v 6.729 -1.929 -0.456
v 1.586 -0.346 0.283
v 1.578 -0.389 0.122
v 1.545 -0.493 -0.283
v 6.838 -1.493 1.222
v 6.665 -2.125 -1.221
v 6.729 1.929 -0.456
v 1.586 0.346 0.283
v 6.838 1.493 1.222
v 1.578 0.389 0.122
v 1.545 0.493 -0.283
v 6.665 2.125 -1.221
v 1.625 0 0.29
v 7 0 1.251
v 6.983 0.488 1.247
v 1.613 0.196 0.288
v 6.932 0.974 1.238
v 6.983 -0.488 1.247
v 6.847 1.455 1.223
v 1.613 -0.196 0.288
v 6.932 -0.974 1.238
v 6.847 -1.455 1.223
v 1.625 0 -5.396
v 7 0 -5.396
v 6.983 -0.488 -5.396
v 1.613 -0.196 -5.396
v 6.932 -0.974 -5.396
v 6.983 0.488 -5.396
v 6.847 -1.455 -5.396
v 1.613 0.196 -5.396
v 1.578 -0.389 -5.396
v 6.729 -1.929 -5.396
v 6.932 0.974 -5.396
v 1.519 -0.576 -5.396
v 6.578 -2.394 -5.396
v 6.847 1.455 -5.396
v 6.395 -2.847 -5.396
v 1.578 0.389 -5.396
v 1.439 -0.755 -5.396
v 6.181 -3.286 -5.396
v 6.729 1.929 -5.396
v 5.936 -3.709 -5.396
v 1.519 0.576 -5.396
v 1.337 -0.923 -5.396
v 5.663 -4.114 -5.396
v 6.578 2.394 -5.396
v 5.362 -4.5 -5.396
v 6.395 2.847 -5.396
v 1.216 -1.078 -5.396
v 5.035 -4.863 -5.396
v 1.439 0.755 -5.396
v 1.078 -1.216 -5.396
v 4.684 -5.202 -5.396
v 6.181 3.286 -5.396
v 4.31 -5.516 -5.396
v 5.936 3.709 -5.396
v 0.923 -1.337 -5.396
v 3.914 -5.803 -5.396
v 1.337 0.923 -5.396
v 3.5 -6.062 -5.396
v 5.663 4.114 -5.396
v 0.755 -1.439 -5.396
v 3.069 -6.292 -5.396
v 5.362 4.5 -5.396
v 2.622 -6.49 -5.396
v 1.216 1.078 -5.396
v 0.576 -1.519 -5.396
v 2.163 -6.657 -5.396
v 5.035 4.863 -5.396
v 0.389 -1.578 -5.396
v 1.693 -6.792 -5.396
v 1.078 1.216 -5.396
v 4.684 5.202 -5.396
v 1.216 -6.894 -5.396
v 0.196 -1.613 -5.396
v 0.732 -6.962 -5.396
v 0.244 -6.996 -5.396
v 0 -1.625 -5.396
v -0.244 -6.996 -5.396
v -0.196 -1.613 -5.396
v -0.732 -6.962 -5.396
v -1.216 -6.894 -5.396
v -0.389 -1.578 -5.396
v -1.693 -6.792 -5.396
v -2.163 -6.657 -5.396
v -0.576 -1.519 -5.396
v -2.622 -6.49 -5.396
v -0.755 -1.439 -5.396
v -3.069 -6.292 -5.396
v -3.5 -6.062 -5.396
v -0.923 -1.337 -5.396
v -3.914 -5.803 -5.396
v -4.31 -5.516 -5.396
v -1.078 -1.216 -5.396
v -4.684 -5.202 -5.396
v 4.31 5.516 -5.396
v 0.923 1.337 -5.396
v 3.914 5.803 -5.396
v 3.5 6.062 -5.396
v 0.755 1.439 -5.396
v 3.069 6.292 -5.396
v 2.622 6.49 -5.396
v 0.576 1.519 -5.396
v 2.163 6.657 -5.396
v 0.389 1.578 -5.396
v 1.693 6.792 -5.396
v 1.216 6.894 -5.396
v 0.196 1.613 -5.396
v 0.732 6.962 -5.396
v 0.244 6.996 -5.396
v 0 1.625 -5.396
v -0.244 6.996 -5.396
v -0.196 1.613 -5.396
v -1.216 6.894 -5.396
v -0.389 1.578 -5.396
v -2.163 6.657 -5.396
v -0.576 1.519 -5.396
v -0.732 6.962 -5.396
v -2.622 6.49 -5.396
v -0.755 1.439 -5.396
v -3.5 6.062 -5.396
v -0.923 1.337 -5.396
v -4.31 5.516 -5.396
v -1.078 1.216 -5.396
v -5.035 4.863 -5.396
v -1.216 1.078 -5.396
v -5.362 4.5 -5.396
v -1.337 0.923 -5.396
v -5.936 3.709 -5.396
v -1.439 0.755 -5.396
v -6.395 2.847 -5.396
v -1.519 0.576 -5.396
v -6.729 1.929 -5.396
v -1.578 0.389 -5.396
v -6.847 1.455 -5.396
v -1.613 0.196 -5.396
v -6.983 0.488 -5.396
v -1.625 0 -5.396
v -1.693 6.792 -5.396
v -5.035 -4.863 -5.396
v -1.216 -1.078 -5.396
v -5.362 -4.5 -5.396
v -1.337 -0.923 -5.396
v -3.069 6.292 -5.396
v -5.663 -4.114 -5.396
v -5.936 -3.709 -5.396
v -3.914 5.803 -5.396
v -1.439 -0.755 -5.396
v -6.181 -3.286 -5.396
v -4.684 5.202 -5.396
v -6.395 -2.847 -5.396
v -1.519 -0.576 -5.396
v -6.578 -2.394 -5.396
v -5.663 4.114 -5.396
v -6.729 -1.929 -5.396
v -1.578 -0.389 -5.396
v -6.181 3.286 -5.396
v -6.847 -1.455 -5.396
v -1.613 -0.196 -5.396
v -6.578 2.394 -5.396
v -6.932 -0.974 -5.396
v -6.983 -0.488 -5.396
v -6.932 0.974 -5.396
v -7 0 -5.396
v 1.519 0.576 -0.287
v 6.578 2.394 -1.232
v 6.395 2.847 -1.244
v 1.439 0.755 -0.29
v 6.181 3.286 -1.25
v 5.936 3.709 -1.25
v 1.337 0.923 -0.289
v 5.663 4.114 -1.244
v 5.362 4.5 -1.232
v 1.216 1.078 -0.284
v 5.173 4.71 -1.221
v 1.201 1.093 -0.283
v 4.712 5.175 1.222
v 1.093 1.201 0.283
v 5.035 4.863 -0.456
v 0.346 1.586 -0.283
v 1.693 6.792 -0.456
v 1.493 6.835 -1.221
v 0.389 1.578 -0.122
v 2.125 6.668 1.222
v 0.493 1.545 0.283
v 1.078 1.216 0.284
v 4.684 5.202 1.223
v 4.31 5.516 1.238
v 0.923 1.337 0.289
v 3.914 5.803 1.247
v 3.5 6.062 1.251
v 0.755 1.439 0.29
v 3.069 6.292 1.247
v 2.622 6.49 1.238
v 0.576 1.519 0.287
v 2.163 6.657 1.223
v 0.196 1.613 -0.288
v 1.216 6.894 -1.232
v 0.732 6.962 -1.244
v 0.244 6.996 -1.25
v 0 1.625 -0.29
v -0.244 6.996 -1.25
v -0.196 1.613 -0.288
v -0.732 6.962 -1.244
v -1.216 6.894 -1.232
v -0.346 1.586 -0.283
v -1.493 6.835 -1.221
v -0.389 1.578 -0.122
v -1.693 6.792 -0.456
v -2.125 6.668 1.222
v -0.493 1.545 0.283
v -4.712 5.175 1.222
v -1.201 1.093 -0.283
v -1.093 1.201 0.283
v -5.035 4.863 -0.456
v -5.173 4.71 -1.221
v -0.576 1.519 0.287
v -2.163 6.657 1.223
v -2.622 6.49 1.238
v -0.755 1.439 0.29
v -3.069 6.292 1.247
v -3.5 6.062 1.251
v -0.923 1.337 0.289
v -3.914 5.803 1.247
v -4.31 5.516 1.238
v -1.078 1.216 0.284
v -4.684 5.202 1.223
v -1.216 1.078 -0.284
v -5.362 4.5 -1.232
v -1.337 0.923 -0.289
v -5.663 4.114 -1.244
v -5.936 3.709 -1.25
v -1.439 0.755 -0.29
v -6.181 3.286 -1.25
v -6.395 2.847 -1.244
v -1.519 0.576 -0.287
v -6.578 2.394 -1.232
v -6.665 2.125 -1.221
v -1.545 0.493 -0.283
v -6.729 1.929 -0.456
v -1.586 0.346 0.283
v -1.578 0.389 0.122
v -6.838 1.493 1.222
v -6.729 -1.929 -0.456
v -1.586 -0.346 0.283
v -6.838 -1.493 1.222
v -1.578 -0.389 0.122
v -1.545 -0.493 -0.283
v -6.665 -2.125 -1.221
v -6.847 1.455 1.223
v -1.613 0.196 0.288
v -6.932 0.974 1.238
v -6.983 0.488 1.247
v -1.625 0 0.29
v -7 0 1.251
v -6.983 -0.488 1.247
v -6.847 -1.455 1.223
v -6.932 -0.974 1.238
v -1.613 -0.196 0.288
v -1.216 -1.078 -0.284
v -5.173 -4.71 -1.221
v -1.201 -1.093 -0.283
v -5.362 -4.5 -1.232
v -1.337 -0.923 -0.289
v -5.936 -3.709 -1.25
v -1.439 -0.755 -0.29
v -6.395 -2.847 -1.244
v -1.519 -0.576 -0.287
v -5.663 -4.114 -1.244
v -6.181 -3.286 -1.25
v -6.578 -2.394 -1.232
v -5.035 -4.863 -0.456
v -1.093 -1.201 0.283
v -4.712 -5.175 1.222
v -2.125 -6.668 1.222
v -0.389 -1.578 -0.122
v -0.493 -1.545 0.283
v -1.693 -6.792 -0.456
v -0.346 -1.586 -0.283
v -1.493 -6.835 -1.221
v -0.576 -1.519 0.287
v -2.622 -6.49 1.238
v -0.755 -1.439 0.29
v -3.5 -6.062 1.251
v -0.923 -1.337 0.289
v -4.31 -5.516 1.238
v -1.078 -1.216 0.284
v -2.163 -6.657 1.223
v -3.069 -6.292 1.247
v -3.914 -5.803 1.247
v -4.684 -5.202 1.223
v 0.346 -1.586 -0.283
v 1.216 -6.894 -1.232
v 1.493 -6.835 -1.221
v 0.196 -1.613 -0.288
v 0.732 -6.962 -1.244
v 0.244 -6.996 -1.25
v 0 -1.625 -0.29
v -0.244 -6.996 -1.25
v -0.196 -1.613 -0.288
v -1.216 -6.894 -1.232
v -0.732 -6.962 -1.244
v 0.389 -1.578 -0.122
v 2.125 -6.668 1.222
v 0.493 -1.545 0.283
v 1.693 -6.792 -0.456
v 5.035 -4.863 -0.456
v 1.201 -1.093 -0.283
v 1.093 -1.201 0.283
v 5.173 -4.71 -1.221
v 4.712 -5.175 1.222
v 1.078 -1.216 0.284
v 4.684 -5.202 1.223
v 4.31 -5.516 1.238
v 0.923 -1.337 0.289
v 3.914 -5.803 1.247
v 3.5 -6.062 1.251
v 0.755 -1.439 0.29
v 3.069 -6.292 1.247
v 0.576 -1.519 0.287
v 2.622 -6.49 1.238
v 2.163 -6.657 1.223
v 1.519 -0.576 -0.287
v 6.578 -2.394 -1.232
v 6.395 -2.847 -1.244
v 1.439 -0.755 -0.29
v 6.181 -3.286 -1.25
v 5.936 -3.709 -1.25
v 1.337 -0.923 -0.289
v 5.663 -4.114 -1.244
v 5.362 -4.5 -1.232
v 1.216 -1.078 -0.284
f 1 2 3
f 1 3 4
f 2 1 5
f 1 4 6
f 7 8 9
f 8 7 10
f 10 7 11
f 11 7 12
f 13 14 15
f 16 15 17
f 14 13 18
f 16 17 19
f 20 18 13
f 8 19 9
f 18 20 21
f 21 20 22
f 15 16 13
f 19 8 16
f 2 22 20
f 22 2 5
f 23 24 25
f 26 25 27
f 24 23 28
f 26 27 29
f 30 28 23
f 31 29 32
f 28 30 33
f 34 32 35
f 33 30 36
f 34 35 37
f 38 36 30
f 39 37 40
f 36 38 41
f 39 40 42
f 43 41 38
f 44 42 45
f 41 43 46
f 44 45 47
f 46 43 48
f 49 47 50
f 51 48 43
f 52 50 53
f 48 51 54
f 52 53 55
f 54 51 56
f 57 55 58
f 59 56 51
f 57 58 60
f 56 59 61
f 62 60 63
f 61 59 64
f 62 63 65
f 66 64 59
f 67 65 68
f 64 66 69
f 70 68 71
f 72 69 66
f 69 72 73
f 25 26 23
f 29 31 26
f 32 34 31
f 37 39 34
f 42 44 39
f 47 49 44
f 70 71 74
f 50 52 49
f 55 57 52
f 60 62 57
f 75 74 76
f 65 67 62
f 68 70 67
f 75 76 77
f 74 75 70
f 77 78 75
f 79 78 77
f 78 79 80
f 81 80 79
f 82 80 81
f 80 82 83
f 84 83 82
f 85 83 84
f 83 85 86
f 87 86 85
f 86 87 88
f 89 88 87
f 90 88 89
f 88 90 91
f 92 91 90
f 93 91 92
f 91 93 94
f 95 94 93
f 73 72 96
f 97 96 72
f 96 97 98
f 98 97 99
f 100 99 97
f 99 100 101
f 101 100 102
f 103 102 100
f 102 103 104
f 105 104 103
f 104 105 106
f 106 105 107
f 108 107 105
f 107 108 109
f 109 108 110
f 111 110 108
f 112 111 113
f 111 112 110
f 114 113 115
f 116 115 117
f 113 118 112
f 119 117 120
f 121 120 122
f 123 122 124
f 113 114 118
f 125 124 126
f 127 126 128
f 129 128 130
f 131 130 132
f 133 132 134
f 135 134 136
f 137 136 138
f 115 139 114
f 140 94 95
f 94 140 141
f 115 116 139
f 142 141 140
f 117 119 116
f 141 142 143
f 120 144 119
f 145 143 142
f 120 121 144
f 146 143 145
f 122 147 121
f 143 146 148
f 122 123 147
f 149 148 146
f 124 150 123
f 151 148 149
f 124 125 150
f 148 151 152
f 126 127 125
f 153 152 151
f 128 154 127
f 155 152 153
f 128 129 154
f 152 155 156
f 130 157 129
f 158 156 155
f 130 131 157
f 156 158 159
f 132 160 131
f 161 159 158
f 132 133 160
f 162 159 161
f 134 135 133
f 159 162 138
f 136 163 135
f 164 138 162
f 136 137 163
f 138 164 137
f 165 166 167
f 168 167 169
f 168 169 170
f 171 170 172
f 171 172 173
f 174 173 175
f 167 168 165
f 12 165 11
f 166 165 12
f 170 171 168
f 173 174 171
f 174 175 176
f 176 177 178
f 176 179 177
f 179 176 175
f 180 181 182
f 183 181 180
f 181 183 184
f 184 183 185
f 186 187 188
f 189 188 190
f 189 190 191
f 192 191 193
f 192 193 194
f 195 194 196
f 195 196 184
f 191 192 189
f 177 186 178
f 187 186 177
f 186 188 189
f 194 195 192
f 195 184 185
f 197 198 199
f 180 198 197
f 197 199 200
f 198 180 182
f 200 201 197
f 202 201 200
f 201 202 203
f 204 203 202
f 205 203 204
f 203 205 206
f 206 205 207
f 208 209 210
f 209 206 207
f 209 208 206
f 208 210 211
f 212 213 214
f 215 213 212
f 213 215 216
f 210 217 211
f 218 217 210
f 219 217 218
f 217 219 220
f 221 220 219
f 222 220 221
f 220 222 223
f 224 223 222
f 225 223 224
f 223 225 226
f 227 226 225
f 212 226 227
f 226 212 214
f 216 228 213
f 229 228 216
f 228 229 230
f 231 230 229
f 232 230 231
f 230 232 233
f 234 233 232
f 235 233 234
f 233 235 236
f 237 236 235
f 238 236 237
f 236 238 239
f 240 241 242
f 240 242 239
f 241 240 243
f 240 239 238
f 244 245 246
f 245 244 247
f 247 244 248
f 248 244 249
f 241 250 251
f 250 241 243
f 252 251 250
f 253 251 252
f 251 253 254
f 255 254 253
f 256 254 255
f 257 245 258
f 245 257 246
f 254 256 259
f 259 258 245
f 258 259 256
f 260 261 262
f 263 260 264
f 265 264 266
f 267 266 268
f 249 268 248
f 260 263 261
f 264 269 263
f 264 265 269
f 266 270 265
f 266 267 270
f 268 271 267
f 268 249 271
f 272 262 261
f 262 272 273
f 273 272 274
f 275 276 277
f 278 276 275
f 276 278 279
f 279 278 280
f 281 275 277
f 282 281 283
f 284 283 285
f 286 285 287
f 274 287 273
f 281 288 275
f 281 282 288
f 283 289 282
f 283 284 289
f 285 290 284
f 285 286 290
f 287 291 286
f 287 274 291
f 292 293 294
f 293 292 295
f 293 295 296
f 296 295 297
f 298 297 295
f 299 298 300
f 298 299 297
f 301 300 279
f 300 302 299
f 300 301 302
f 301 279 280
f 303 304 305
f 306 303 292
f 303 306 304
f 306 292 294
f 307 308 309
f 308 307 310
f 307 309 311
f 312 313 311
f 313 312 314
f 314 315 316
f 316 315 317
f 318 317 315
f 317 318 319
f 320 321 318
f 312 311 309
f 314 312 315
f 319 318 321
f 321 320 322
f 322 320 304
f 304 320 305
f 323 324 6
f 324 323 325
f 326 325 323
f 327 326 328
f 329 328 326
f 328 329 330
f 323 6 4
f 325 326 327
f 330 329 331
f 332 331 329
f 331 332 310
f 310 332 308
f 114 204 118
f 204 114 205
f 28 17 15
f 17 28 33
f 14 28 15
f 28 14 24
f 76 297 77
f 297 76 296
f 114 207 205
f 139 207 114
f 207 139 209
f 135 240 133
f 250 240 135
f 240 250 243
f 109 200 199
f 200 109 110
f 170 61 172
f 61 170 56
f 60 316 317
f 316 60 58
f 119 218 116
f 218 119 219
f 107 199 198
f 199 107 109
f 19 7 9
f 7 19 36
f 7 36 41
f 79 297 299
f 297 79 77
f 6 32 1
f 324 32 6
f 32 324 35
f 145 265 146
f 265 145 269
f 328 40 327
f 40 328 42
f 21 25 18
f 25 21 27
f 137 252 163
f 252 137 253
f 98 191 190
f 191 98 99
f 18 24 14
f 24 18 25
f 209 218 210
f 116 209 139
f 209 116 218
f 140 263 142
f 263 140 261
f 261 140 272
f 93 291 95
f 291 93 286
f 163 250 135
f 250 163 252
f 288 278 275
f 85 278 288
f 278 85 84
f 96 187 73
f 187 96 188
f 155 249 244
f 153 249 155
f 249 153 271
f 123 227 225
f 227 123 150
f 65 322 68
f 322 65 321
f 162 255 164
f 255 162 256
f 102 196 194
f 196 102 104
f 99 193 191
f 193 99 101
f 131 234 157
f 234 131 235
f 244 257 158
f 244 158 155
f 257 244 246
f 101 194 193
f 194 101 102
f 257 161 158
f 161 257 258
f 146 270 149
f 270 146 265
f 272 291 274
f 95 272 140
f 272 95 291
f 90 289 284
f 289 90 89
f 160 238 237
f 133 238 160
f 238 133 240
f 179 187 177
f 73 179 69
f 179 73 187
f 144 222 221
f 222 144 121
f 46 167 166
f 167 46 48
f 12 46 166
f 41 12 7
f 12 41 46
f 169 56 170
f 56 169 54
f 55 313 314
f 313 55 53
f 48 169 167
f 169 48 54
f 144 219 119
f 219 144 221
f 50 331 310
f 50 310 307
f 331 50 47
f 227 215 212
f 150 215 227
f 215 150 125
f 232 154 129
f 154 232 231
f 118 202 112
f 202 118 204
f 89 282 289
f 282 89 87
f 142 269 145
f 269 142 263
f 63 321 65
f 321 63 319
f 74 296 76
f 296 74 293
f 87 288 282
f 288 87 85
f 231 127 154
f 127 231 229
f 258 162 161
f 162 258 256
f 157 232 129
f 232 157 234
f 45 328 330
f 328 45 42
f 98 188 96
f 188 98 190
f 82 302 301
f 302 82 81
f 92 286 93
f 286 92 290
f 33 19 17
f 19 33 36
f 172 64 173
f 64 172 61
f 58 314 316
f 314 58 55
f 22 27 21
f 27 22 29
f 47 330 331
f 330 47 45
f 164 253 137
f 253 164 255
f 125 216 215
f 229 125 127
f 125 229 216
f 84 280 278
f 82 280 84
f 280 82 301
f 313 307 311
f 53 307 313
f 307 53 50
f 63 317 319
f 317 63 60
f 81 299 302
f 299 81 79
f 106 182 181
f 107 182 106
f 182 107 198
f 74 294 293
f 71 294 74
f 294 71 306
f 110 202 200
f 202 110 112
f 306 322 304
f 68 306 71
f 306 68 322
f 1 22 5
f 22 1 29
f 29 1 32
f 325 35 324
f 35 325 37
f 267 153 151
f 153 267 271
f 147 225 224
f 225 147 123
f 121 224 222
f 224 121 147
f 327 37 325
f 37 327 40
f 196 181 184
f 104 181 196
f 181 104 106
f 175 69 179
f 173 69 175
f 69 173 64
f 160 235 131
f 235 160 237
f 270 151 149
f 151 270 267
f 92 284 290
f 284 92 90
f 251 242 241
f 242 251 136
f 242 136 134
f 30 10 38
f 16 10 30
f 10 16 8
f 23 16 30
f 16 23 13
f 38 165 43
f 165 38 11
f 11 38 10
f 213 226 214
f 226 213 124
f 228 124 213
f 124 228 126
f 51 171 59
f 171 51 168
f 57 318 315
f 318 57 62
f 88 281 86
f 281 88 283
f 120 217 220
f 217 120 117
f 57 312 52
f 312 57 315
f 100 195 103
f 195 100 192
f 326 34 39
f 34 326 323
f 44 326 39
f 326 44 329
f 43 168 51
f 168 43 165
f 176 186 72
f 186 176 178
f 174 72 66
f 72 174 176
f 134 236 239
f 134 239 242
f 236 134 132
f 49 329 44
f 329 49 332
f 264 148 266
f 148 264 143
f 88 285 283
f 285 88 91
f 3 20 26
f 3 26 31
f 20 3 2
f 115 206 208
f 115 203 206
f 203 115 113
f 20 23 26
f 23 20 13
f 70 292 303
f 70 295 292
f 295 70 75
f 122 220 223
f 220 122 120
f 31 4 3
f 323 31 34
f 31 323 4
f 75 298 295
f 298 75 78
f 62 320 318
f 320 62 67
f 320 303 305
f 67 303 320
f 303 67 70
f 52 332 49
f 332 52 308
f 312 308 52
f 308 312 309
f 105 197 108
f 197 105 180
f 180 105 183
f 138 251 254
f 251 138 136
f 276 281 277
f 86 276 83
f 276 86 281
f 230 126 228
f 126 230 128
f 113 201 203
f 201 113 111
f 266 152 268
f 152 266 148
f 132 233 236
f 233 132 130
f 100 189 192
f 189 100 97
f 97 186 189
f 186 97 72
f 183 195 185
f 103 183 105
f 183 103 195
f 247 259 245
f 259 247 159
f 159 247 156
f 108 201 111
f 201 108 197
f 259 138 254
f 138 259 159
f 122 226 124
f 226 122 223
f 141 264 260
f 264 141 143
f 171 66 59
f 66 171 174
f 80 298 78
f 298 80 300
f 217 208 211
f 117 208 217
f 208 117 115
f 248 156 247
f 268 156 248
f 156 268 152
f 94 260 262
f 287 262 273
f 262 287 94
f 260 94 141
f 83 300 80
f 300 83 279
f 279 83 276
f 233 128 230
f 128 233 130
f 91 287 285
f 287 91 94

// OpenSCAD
// author:  Lukas Süss aka mechadense
// date:    2014-07
// title:   parametric Hirth-joint
// license: public domain


/*
This is a trapezoidal Hirt-joint generator.

usage:
* either use customizer
* or use it as a library:
hirth(
  period_number,
  flank_angle,
  base_hight,
  vertex_radius,
  [cutround_diameter|default=0...do_not_cut_round],
  [bore_radius|default=0...no_bore],
  [vertical_stretching_factor|default=1],
  [colormarked_vertices|default=false]);
*/

/*

alternate name: V-tooth coupling
maybe related: curvic couplings

TODO:
  further subdivide mantle-triangles so that the mantle-flanks
  stay parallel to the z-axis and don't slant inward
  especially important for period_number=2 and high flank angles
  (see demogrid)

TODO: 
  create alternate more elegant volumetric version defined via halfspaces
  (plane normals)

TODO:
  Create a version that uses a regular polygon instead of a single point
  at the center. This is can enforces self centering on hirth couplings 
  of tubes (big bores) without aligning screw.
  such couplings can be found on bicycle axle couplings.

TODO: still buggy:
  with z0=1 and gamma0=45° the teeth should become triangular...

*/

// ################################ customizer parameters

/* [Global] */

// flank angle (looking from the side; measured from vertical)
gamma0 = 15;
// number of periods (>=2)
nn0 = 6; //[2:42]

// radius
r0 = 8; // <<<<<<<<<<<<<<<<<<<<<<<<<<<<<<<<<<<<<<<<<<<
// scaling indentation depth (changes flank angle!)

// diameter of center bore
dbore0 = 3.25; // not yet implemented
// radius to cut from the polygonsal base shape (0 ... do not cut)
rcut0 = 7;

//increase groove depth / flank hight 
z0 = 1;
// hight of base body to centerpoint
h0 = 4;

// ################################# constants

/* [Hidden] */

pi = 3.141592653*1;
//centerpoint
cc = [0,0,0]*1;
//$fa = 5*1; $fn = 0.1*1;
degreetorad = ((2*pi)/360);
radtodegree = (360/(2*pi));


// ########################
// ########################
// ########################

// size estimation cube
// translate([0,0,20]) cube([10,10,10],center=true);

hirth(nn0,gamma0,h0,r0,rcut0,dbore0,z0); // <<<<<<<<<<<<<<<<<<<<<<<<<<<<<<
//pairing();// <<<<<<<<<<<<<<<<<<<<<<<<<<<<<<
//demogrid();// <<<<<<<<<<<<<<<<<<<<<<<<<<<<<<


module pairing(expl=0.5)
{
  //color("orange") // ?
  translate([0,0,-expl/2])
  hirth(nn0,gamma0,h0,r0,rcut0,dbore0,z0);

  translate([0,0,+expl/2])
  rotate(360/nn0/2,[0,0,1]) scale([1,1,-1])
  hirth(nn0,gamma0,h0,r0,rcut0,dbore0,z0); 
}

module demogrid()
{
  for(i=[2:6]){ for(j=[1:5]){
    translate([(i-2)*r0*2.5,(j-1)*r0*2.5,0])
      hirth(i,10*j,h0,r0);
  }}
}

// ########################## 

module hirth(nn,              // * number of periods
             gamma,           // * flank angle
             h,               // * base body hight
             rr,              // * rough polygonal radius
             rcutround = 0,   // if > 0 => radius of intersecting cylinder 
             dbore = 0,       // 0 ... no bore
             z = 1,           // scale cutoff hight
             colvert = false) // for easier vertex identification
{
  // -------------- derived sizes
  n = max(2,nn);
  // periodicity angle
  a = 360/n;
  // double triagle to trapezoid cutoff hight
  // choosen such that at the unit circle 
  cutoff = a*degreetorad /3*z; // <= (gamma <= 45°)
  b = cutoff*tan(gamma) *radtodegree;
  a_head = a/2-b;
  a_root = a/2+b;
  h3 = [0,0,h]*1; // helper vector

  function h1(i) = [cos(i*a-a_head/2),sin(i*a-a_head/2),cutoff/2];
  function h2(i) = [cos(i*a+a_head/2),sin(i*a+a_head/2),cutoff/2];
  function r1(i) = [cos(i*a-a_root/2),sin(i*a-a_root/2),-cutoff/2];
  function r2(i) = [cos(i*a+a_root/2),sin(i*a+a_root/2),-cutoff/2];

  difference()
  {
    intersection()
    {
      for(i=[0:n-1])
      {
        toothpolyeder(i);
        // translate([cos(i*a)*1,sin(i*a)*1,-1]) // explode
        basepolyeder(i);
      }
      if(rcutround>0)
      {
        echo("cutround");
        translate([0,0,-3*h])
          cylinder(r=rcutround, h= 6*(h+10),$fa=4,$fs=0.2); // Hack
      }
    }
    if(dbore>0)
    {
      translate([0,0,-3*h])
        cylinder(r=dbore/2, h= 6*h,$fa=4,$fs=0.2);
    }
  }

  module toothpolyeder(i)
  {
    ps = [cc, h1(i)*rr, h2(i)*rr, r1(i)*rr, r2(i)*rr];
    ts = [ [0,1,3],[0,2,1],[0,4,2], // left top and right flank
           [1,4,3],[1,2,4], // mantle (todo: subdivide)
           [0,3,4] ]; // bottom
    polyhedron(points = ps, triangles = ts, convexity = 3);
  }

  module basepolyeder(i)
  {
    ps = [cc, r1(i)*rr, r2(i)*rr, r1(i+1)*rr,
          [0,0,-cutoff/2*rr]-h3, r1(i)*rr-h3, r2(i)*rr-h3, r1(i+1)*rr-h3];
    ts = [ [0,2,1],[0,3,2], [4,5,6],[4,6,7],    // top & bottom
           [1,6,5],[1,2,6], [2,7,6],[2,3,7],    //  mantle (todo: subdivide)
           [0,5,4],[0,1,5], [3,4,7],[3,0,4] ];  // antikoplanar :S 
    polyhedron(points = ps, triangles = ts, convexity = 3);
  }

  if(colvert)
  {
    for(i=[0:n-1])
    {
      color("red")    translate(h1(i)*s) sphere(r=1);
      color("orange") translate(h2(i)*s) sphere(r=1);
      color("yellow") translate(r1(i)*s) sphere(r=1);
      color("green")  translate(r2(i)*s) sphere(r=1);
    }
  }

}
